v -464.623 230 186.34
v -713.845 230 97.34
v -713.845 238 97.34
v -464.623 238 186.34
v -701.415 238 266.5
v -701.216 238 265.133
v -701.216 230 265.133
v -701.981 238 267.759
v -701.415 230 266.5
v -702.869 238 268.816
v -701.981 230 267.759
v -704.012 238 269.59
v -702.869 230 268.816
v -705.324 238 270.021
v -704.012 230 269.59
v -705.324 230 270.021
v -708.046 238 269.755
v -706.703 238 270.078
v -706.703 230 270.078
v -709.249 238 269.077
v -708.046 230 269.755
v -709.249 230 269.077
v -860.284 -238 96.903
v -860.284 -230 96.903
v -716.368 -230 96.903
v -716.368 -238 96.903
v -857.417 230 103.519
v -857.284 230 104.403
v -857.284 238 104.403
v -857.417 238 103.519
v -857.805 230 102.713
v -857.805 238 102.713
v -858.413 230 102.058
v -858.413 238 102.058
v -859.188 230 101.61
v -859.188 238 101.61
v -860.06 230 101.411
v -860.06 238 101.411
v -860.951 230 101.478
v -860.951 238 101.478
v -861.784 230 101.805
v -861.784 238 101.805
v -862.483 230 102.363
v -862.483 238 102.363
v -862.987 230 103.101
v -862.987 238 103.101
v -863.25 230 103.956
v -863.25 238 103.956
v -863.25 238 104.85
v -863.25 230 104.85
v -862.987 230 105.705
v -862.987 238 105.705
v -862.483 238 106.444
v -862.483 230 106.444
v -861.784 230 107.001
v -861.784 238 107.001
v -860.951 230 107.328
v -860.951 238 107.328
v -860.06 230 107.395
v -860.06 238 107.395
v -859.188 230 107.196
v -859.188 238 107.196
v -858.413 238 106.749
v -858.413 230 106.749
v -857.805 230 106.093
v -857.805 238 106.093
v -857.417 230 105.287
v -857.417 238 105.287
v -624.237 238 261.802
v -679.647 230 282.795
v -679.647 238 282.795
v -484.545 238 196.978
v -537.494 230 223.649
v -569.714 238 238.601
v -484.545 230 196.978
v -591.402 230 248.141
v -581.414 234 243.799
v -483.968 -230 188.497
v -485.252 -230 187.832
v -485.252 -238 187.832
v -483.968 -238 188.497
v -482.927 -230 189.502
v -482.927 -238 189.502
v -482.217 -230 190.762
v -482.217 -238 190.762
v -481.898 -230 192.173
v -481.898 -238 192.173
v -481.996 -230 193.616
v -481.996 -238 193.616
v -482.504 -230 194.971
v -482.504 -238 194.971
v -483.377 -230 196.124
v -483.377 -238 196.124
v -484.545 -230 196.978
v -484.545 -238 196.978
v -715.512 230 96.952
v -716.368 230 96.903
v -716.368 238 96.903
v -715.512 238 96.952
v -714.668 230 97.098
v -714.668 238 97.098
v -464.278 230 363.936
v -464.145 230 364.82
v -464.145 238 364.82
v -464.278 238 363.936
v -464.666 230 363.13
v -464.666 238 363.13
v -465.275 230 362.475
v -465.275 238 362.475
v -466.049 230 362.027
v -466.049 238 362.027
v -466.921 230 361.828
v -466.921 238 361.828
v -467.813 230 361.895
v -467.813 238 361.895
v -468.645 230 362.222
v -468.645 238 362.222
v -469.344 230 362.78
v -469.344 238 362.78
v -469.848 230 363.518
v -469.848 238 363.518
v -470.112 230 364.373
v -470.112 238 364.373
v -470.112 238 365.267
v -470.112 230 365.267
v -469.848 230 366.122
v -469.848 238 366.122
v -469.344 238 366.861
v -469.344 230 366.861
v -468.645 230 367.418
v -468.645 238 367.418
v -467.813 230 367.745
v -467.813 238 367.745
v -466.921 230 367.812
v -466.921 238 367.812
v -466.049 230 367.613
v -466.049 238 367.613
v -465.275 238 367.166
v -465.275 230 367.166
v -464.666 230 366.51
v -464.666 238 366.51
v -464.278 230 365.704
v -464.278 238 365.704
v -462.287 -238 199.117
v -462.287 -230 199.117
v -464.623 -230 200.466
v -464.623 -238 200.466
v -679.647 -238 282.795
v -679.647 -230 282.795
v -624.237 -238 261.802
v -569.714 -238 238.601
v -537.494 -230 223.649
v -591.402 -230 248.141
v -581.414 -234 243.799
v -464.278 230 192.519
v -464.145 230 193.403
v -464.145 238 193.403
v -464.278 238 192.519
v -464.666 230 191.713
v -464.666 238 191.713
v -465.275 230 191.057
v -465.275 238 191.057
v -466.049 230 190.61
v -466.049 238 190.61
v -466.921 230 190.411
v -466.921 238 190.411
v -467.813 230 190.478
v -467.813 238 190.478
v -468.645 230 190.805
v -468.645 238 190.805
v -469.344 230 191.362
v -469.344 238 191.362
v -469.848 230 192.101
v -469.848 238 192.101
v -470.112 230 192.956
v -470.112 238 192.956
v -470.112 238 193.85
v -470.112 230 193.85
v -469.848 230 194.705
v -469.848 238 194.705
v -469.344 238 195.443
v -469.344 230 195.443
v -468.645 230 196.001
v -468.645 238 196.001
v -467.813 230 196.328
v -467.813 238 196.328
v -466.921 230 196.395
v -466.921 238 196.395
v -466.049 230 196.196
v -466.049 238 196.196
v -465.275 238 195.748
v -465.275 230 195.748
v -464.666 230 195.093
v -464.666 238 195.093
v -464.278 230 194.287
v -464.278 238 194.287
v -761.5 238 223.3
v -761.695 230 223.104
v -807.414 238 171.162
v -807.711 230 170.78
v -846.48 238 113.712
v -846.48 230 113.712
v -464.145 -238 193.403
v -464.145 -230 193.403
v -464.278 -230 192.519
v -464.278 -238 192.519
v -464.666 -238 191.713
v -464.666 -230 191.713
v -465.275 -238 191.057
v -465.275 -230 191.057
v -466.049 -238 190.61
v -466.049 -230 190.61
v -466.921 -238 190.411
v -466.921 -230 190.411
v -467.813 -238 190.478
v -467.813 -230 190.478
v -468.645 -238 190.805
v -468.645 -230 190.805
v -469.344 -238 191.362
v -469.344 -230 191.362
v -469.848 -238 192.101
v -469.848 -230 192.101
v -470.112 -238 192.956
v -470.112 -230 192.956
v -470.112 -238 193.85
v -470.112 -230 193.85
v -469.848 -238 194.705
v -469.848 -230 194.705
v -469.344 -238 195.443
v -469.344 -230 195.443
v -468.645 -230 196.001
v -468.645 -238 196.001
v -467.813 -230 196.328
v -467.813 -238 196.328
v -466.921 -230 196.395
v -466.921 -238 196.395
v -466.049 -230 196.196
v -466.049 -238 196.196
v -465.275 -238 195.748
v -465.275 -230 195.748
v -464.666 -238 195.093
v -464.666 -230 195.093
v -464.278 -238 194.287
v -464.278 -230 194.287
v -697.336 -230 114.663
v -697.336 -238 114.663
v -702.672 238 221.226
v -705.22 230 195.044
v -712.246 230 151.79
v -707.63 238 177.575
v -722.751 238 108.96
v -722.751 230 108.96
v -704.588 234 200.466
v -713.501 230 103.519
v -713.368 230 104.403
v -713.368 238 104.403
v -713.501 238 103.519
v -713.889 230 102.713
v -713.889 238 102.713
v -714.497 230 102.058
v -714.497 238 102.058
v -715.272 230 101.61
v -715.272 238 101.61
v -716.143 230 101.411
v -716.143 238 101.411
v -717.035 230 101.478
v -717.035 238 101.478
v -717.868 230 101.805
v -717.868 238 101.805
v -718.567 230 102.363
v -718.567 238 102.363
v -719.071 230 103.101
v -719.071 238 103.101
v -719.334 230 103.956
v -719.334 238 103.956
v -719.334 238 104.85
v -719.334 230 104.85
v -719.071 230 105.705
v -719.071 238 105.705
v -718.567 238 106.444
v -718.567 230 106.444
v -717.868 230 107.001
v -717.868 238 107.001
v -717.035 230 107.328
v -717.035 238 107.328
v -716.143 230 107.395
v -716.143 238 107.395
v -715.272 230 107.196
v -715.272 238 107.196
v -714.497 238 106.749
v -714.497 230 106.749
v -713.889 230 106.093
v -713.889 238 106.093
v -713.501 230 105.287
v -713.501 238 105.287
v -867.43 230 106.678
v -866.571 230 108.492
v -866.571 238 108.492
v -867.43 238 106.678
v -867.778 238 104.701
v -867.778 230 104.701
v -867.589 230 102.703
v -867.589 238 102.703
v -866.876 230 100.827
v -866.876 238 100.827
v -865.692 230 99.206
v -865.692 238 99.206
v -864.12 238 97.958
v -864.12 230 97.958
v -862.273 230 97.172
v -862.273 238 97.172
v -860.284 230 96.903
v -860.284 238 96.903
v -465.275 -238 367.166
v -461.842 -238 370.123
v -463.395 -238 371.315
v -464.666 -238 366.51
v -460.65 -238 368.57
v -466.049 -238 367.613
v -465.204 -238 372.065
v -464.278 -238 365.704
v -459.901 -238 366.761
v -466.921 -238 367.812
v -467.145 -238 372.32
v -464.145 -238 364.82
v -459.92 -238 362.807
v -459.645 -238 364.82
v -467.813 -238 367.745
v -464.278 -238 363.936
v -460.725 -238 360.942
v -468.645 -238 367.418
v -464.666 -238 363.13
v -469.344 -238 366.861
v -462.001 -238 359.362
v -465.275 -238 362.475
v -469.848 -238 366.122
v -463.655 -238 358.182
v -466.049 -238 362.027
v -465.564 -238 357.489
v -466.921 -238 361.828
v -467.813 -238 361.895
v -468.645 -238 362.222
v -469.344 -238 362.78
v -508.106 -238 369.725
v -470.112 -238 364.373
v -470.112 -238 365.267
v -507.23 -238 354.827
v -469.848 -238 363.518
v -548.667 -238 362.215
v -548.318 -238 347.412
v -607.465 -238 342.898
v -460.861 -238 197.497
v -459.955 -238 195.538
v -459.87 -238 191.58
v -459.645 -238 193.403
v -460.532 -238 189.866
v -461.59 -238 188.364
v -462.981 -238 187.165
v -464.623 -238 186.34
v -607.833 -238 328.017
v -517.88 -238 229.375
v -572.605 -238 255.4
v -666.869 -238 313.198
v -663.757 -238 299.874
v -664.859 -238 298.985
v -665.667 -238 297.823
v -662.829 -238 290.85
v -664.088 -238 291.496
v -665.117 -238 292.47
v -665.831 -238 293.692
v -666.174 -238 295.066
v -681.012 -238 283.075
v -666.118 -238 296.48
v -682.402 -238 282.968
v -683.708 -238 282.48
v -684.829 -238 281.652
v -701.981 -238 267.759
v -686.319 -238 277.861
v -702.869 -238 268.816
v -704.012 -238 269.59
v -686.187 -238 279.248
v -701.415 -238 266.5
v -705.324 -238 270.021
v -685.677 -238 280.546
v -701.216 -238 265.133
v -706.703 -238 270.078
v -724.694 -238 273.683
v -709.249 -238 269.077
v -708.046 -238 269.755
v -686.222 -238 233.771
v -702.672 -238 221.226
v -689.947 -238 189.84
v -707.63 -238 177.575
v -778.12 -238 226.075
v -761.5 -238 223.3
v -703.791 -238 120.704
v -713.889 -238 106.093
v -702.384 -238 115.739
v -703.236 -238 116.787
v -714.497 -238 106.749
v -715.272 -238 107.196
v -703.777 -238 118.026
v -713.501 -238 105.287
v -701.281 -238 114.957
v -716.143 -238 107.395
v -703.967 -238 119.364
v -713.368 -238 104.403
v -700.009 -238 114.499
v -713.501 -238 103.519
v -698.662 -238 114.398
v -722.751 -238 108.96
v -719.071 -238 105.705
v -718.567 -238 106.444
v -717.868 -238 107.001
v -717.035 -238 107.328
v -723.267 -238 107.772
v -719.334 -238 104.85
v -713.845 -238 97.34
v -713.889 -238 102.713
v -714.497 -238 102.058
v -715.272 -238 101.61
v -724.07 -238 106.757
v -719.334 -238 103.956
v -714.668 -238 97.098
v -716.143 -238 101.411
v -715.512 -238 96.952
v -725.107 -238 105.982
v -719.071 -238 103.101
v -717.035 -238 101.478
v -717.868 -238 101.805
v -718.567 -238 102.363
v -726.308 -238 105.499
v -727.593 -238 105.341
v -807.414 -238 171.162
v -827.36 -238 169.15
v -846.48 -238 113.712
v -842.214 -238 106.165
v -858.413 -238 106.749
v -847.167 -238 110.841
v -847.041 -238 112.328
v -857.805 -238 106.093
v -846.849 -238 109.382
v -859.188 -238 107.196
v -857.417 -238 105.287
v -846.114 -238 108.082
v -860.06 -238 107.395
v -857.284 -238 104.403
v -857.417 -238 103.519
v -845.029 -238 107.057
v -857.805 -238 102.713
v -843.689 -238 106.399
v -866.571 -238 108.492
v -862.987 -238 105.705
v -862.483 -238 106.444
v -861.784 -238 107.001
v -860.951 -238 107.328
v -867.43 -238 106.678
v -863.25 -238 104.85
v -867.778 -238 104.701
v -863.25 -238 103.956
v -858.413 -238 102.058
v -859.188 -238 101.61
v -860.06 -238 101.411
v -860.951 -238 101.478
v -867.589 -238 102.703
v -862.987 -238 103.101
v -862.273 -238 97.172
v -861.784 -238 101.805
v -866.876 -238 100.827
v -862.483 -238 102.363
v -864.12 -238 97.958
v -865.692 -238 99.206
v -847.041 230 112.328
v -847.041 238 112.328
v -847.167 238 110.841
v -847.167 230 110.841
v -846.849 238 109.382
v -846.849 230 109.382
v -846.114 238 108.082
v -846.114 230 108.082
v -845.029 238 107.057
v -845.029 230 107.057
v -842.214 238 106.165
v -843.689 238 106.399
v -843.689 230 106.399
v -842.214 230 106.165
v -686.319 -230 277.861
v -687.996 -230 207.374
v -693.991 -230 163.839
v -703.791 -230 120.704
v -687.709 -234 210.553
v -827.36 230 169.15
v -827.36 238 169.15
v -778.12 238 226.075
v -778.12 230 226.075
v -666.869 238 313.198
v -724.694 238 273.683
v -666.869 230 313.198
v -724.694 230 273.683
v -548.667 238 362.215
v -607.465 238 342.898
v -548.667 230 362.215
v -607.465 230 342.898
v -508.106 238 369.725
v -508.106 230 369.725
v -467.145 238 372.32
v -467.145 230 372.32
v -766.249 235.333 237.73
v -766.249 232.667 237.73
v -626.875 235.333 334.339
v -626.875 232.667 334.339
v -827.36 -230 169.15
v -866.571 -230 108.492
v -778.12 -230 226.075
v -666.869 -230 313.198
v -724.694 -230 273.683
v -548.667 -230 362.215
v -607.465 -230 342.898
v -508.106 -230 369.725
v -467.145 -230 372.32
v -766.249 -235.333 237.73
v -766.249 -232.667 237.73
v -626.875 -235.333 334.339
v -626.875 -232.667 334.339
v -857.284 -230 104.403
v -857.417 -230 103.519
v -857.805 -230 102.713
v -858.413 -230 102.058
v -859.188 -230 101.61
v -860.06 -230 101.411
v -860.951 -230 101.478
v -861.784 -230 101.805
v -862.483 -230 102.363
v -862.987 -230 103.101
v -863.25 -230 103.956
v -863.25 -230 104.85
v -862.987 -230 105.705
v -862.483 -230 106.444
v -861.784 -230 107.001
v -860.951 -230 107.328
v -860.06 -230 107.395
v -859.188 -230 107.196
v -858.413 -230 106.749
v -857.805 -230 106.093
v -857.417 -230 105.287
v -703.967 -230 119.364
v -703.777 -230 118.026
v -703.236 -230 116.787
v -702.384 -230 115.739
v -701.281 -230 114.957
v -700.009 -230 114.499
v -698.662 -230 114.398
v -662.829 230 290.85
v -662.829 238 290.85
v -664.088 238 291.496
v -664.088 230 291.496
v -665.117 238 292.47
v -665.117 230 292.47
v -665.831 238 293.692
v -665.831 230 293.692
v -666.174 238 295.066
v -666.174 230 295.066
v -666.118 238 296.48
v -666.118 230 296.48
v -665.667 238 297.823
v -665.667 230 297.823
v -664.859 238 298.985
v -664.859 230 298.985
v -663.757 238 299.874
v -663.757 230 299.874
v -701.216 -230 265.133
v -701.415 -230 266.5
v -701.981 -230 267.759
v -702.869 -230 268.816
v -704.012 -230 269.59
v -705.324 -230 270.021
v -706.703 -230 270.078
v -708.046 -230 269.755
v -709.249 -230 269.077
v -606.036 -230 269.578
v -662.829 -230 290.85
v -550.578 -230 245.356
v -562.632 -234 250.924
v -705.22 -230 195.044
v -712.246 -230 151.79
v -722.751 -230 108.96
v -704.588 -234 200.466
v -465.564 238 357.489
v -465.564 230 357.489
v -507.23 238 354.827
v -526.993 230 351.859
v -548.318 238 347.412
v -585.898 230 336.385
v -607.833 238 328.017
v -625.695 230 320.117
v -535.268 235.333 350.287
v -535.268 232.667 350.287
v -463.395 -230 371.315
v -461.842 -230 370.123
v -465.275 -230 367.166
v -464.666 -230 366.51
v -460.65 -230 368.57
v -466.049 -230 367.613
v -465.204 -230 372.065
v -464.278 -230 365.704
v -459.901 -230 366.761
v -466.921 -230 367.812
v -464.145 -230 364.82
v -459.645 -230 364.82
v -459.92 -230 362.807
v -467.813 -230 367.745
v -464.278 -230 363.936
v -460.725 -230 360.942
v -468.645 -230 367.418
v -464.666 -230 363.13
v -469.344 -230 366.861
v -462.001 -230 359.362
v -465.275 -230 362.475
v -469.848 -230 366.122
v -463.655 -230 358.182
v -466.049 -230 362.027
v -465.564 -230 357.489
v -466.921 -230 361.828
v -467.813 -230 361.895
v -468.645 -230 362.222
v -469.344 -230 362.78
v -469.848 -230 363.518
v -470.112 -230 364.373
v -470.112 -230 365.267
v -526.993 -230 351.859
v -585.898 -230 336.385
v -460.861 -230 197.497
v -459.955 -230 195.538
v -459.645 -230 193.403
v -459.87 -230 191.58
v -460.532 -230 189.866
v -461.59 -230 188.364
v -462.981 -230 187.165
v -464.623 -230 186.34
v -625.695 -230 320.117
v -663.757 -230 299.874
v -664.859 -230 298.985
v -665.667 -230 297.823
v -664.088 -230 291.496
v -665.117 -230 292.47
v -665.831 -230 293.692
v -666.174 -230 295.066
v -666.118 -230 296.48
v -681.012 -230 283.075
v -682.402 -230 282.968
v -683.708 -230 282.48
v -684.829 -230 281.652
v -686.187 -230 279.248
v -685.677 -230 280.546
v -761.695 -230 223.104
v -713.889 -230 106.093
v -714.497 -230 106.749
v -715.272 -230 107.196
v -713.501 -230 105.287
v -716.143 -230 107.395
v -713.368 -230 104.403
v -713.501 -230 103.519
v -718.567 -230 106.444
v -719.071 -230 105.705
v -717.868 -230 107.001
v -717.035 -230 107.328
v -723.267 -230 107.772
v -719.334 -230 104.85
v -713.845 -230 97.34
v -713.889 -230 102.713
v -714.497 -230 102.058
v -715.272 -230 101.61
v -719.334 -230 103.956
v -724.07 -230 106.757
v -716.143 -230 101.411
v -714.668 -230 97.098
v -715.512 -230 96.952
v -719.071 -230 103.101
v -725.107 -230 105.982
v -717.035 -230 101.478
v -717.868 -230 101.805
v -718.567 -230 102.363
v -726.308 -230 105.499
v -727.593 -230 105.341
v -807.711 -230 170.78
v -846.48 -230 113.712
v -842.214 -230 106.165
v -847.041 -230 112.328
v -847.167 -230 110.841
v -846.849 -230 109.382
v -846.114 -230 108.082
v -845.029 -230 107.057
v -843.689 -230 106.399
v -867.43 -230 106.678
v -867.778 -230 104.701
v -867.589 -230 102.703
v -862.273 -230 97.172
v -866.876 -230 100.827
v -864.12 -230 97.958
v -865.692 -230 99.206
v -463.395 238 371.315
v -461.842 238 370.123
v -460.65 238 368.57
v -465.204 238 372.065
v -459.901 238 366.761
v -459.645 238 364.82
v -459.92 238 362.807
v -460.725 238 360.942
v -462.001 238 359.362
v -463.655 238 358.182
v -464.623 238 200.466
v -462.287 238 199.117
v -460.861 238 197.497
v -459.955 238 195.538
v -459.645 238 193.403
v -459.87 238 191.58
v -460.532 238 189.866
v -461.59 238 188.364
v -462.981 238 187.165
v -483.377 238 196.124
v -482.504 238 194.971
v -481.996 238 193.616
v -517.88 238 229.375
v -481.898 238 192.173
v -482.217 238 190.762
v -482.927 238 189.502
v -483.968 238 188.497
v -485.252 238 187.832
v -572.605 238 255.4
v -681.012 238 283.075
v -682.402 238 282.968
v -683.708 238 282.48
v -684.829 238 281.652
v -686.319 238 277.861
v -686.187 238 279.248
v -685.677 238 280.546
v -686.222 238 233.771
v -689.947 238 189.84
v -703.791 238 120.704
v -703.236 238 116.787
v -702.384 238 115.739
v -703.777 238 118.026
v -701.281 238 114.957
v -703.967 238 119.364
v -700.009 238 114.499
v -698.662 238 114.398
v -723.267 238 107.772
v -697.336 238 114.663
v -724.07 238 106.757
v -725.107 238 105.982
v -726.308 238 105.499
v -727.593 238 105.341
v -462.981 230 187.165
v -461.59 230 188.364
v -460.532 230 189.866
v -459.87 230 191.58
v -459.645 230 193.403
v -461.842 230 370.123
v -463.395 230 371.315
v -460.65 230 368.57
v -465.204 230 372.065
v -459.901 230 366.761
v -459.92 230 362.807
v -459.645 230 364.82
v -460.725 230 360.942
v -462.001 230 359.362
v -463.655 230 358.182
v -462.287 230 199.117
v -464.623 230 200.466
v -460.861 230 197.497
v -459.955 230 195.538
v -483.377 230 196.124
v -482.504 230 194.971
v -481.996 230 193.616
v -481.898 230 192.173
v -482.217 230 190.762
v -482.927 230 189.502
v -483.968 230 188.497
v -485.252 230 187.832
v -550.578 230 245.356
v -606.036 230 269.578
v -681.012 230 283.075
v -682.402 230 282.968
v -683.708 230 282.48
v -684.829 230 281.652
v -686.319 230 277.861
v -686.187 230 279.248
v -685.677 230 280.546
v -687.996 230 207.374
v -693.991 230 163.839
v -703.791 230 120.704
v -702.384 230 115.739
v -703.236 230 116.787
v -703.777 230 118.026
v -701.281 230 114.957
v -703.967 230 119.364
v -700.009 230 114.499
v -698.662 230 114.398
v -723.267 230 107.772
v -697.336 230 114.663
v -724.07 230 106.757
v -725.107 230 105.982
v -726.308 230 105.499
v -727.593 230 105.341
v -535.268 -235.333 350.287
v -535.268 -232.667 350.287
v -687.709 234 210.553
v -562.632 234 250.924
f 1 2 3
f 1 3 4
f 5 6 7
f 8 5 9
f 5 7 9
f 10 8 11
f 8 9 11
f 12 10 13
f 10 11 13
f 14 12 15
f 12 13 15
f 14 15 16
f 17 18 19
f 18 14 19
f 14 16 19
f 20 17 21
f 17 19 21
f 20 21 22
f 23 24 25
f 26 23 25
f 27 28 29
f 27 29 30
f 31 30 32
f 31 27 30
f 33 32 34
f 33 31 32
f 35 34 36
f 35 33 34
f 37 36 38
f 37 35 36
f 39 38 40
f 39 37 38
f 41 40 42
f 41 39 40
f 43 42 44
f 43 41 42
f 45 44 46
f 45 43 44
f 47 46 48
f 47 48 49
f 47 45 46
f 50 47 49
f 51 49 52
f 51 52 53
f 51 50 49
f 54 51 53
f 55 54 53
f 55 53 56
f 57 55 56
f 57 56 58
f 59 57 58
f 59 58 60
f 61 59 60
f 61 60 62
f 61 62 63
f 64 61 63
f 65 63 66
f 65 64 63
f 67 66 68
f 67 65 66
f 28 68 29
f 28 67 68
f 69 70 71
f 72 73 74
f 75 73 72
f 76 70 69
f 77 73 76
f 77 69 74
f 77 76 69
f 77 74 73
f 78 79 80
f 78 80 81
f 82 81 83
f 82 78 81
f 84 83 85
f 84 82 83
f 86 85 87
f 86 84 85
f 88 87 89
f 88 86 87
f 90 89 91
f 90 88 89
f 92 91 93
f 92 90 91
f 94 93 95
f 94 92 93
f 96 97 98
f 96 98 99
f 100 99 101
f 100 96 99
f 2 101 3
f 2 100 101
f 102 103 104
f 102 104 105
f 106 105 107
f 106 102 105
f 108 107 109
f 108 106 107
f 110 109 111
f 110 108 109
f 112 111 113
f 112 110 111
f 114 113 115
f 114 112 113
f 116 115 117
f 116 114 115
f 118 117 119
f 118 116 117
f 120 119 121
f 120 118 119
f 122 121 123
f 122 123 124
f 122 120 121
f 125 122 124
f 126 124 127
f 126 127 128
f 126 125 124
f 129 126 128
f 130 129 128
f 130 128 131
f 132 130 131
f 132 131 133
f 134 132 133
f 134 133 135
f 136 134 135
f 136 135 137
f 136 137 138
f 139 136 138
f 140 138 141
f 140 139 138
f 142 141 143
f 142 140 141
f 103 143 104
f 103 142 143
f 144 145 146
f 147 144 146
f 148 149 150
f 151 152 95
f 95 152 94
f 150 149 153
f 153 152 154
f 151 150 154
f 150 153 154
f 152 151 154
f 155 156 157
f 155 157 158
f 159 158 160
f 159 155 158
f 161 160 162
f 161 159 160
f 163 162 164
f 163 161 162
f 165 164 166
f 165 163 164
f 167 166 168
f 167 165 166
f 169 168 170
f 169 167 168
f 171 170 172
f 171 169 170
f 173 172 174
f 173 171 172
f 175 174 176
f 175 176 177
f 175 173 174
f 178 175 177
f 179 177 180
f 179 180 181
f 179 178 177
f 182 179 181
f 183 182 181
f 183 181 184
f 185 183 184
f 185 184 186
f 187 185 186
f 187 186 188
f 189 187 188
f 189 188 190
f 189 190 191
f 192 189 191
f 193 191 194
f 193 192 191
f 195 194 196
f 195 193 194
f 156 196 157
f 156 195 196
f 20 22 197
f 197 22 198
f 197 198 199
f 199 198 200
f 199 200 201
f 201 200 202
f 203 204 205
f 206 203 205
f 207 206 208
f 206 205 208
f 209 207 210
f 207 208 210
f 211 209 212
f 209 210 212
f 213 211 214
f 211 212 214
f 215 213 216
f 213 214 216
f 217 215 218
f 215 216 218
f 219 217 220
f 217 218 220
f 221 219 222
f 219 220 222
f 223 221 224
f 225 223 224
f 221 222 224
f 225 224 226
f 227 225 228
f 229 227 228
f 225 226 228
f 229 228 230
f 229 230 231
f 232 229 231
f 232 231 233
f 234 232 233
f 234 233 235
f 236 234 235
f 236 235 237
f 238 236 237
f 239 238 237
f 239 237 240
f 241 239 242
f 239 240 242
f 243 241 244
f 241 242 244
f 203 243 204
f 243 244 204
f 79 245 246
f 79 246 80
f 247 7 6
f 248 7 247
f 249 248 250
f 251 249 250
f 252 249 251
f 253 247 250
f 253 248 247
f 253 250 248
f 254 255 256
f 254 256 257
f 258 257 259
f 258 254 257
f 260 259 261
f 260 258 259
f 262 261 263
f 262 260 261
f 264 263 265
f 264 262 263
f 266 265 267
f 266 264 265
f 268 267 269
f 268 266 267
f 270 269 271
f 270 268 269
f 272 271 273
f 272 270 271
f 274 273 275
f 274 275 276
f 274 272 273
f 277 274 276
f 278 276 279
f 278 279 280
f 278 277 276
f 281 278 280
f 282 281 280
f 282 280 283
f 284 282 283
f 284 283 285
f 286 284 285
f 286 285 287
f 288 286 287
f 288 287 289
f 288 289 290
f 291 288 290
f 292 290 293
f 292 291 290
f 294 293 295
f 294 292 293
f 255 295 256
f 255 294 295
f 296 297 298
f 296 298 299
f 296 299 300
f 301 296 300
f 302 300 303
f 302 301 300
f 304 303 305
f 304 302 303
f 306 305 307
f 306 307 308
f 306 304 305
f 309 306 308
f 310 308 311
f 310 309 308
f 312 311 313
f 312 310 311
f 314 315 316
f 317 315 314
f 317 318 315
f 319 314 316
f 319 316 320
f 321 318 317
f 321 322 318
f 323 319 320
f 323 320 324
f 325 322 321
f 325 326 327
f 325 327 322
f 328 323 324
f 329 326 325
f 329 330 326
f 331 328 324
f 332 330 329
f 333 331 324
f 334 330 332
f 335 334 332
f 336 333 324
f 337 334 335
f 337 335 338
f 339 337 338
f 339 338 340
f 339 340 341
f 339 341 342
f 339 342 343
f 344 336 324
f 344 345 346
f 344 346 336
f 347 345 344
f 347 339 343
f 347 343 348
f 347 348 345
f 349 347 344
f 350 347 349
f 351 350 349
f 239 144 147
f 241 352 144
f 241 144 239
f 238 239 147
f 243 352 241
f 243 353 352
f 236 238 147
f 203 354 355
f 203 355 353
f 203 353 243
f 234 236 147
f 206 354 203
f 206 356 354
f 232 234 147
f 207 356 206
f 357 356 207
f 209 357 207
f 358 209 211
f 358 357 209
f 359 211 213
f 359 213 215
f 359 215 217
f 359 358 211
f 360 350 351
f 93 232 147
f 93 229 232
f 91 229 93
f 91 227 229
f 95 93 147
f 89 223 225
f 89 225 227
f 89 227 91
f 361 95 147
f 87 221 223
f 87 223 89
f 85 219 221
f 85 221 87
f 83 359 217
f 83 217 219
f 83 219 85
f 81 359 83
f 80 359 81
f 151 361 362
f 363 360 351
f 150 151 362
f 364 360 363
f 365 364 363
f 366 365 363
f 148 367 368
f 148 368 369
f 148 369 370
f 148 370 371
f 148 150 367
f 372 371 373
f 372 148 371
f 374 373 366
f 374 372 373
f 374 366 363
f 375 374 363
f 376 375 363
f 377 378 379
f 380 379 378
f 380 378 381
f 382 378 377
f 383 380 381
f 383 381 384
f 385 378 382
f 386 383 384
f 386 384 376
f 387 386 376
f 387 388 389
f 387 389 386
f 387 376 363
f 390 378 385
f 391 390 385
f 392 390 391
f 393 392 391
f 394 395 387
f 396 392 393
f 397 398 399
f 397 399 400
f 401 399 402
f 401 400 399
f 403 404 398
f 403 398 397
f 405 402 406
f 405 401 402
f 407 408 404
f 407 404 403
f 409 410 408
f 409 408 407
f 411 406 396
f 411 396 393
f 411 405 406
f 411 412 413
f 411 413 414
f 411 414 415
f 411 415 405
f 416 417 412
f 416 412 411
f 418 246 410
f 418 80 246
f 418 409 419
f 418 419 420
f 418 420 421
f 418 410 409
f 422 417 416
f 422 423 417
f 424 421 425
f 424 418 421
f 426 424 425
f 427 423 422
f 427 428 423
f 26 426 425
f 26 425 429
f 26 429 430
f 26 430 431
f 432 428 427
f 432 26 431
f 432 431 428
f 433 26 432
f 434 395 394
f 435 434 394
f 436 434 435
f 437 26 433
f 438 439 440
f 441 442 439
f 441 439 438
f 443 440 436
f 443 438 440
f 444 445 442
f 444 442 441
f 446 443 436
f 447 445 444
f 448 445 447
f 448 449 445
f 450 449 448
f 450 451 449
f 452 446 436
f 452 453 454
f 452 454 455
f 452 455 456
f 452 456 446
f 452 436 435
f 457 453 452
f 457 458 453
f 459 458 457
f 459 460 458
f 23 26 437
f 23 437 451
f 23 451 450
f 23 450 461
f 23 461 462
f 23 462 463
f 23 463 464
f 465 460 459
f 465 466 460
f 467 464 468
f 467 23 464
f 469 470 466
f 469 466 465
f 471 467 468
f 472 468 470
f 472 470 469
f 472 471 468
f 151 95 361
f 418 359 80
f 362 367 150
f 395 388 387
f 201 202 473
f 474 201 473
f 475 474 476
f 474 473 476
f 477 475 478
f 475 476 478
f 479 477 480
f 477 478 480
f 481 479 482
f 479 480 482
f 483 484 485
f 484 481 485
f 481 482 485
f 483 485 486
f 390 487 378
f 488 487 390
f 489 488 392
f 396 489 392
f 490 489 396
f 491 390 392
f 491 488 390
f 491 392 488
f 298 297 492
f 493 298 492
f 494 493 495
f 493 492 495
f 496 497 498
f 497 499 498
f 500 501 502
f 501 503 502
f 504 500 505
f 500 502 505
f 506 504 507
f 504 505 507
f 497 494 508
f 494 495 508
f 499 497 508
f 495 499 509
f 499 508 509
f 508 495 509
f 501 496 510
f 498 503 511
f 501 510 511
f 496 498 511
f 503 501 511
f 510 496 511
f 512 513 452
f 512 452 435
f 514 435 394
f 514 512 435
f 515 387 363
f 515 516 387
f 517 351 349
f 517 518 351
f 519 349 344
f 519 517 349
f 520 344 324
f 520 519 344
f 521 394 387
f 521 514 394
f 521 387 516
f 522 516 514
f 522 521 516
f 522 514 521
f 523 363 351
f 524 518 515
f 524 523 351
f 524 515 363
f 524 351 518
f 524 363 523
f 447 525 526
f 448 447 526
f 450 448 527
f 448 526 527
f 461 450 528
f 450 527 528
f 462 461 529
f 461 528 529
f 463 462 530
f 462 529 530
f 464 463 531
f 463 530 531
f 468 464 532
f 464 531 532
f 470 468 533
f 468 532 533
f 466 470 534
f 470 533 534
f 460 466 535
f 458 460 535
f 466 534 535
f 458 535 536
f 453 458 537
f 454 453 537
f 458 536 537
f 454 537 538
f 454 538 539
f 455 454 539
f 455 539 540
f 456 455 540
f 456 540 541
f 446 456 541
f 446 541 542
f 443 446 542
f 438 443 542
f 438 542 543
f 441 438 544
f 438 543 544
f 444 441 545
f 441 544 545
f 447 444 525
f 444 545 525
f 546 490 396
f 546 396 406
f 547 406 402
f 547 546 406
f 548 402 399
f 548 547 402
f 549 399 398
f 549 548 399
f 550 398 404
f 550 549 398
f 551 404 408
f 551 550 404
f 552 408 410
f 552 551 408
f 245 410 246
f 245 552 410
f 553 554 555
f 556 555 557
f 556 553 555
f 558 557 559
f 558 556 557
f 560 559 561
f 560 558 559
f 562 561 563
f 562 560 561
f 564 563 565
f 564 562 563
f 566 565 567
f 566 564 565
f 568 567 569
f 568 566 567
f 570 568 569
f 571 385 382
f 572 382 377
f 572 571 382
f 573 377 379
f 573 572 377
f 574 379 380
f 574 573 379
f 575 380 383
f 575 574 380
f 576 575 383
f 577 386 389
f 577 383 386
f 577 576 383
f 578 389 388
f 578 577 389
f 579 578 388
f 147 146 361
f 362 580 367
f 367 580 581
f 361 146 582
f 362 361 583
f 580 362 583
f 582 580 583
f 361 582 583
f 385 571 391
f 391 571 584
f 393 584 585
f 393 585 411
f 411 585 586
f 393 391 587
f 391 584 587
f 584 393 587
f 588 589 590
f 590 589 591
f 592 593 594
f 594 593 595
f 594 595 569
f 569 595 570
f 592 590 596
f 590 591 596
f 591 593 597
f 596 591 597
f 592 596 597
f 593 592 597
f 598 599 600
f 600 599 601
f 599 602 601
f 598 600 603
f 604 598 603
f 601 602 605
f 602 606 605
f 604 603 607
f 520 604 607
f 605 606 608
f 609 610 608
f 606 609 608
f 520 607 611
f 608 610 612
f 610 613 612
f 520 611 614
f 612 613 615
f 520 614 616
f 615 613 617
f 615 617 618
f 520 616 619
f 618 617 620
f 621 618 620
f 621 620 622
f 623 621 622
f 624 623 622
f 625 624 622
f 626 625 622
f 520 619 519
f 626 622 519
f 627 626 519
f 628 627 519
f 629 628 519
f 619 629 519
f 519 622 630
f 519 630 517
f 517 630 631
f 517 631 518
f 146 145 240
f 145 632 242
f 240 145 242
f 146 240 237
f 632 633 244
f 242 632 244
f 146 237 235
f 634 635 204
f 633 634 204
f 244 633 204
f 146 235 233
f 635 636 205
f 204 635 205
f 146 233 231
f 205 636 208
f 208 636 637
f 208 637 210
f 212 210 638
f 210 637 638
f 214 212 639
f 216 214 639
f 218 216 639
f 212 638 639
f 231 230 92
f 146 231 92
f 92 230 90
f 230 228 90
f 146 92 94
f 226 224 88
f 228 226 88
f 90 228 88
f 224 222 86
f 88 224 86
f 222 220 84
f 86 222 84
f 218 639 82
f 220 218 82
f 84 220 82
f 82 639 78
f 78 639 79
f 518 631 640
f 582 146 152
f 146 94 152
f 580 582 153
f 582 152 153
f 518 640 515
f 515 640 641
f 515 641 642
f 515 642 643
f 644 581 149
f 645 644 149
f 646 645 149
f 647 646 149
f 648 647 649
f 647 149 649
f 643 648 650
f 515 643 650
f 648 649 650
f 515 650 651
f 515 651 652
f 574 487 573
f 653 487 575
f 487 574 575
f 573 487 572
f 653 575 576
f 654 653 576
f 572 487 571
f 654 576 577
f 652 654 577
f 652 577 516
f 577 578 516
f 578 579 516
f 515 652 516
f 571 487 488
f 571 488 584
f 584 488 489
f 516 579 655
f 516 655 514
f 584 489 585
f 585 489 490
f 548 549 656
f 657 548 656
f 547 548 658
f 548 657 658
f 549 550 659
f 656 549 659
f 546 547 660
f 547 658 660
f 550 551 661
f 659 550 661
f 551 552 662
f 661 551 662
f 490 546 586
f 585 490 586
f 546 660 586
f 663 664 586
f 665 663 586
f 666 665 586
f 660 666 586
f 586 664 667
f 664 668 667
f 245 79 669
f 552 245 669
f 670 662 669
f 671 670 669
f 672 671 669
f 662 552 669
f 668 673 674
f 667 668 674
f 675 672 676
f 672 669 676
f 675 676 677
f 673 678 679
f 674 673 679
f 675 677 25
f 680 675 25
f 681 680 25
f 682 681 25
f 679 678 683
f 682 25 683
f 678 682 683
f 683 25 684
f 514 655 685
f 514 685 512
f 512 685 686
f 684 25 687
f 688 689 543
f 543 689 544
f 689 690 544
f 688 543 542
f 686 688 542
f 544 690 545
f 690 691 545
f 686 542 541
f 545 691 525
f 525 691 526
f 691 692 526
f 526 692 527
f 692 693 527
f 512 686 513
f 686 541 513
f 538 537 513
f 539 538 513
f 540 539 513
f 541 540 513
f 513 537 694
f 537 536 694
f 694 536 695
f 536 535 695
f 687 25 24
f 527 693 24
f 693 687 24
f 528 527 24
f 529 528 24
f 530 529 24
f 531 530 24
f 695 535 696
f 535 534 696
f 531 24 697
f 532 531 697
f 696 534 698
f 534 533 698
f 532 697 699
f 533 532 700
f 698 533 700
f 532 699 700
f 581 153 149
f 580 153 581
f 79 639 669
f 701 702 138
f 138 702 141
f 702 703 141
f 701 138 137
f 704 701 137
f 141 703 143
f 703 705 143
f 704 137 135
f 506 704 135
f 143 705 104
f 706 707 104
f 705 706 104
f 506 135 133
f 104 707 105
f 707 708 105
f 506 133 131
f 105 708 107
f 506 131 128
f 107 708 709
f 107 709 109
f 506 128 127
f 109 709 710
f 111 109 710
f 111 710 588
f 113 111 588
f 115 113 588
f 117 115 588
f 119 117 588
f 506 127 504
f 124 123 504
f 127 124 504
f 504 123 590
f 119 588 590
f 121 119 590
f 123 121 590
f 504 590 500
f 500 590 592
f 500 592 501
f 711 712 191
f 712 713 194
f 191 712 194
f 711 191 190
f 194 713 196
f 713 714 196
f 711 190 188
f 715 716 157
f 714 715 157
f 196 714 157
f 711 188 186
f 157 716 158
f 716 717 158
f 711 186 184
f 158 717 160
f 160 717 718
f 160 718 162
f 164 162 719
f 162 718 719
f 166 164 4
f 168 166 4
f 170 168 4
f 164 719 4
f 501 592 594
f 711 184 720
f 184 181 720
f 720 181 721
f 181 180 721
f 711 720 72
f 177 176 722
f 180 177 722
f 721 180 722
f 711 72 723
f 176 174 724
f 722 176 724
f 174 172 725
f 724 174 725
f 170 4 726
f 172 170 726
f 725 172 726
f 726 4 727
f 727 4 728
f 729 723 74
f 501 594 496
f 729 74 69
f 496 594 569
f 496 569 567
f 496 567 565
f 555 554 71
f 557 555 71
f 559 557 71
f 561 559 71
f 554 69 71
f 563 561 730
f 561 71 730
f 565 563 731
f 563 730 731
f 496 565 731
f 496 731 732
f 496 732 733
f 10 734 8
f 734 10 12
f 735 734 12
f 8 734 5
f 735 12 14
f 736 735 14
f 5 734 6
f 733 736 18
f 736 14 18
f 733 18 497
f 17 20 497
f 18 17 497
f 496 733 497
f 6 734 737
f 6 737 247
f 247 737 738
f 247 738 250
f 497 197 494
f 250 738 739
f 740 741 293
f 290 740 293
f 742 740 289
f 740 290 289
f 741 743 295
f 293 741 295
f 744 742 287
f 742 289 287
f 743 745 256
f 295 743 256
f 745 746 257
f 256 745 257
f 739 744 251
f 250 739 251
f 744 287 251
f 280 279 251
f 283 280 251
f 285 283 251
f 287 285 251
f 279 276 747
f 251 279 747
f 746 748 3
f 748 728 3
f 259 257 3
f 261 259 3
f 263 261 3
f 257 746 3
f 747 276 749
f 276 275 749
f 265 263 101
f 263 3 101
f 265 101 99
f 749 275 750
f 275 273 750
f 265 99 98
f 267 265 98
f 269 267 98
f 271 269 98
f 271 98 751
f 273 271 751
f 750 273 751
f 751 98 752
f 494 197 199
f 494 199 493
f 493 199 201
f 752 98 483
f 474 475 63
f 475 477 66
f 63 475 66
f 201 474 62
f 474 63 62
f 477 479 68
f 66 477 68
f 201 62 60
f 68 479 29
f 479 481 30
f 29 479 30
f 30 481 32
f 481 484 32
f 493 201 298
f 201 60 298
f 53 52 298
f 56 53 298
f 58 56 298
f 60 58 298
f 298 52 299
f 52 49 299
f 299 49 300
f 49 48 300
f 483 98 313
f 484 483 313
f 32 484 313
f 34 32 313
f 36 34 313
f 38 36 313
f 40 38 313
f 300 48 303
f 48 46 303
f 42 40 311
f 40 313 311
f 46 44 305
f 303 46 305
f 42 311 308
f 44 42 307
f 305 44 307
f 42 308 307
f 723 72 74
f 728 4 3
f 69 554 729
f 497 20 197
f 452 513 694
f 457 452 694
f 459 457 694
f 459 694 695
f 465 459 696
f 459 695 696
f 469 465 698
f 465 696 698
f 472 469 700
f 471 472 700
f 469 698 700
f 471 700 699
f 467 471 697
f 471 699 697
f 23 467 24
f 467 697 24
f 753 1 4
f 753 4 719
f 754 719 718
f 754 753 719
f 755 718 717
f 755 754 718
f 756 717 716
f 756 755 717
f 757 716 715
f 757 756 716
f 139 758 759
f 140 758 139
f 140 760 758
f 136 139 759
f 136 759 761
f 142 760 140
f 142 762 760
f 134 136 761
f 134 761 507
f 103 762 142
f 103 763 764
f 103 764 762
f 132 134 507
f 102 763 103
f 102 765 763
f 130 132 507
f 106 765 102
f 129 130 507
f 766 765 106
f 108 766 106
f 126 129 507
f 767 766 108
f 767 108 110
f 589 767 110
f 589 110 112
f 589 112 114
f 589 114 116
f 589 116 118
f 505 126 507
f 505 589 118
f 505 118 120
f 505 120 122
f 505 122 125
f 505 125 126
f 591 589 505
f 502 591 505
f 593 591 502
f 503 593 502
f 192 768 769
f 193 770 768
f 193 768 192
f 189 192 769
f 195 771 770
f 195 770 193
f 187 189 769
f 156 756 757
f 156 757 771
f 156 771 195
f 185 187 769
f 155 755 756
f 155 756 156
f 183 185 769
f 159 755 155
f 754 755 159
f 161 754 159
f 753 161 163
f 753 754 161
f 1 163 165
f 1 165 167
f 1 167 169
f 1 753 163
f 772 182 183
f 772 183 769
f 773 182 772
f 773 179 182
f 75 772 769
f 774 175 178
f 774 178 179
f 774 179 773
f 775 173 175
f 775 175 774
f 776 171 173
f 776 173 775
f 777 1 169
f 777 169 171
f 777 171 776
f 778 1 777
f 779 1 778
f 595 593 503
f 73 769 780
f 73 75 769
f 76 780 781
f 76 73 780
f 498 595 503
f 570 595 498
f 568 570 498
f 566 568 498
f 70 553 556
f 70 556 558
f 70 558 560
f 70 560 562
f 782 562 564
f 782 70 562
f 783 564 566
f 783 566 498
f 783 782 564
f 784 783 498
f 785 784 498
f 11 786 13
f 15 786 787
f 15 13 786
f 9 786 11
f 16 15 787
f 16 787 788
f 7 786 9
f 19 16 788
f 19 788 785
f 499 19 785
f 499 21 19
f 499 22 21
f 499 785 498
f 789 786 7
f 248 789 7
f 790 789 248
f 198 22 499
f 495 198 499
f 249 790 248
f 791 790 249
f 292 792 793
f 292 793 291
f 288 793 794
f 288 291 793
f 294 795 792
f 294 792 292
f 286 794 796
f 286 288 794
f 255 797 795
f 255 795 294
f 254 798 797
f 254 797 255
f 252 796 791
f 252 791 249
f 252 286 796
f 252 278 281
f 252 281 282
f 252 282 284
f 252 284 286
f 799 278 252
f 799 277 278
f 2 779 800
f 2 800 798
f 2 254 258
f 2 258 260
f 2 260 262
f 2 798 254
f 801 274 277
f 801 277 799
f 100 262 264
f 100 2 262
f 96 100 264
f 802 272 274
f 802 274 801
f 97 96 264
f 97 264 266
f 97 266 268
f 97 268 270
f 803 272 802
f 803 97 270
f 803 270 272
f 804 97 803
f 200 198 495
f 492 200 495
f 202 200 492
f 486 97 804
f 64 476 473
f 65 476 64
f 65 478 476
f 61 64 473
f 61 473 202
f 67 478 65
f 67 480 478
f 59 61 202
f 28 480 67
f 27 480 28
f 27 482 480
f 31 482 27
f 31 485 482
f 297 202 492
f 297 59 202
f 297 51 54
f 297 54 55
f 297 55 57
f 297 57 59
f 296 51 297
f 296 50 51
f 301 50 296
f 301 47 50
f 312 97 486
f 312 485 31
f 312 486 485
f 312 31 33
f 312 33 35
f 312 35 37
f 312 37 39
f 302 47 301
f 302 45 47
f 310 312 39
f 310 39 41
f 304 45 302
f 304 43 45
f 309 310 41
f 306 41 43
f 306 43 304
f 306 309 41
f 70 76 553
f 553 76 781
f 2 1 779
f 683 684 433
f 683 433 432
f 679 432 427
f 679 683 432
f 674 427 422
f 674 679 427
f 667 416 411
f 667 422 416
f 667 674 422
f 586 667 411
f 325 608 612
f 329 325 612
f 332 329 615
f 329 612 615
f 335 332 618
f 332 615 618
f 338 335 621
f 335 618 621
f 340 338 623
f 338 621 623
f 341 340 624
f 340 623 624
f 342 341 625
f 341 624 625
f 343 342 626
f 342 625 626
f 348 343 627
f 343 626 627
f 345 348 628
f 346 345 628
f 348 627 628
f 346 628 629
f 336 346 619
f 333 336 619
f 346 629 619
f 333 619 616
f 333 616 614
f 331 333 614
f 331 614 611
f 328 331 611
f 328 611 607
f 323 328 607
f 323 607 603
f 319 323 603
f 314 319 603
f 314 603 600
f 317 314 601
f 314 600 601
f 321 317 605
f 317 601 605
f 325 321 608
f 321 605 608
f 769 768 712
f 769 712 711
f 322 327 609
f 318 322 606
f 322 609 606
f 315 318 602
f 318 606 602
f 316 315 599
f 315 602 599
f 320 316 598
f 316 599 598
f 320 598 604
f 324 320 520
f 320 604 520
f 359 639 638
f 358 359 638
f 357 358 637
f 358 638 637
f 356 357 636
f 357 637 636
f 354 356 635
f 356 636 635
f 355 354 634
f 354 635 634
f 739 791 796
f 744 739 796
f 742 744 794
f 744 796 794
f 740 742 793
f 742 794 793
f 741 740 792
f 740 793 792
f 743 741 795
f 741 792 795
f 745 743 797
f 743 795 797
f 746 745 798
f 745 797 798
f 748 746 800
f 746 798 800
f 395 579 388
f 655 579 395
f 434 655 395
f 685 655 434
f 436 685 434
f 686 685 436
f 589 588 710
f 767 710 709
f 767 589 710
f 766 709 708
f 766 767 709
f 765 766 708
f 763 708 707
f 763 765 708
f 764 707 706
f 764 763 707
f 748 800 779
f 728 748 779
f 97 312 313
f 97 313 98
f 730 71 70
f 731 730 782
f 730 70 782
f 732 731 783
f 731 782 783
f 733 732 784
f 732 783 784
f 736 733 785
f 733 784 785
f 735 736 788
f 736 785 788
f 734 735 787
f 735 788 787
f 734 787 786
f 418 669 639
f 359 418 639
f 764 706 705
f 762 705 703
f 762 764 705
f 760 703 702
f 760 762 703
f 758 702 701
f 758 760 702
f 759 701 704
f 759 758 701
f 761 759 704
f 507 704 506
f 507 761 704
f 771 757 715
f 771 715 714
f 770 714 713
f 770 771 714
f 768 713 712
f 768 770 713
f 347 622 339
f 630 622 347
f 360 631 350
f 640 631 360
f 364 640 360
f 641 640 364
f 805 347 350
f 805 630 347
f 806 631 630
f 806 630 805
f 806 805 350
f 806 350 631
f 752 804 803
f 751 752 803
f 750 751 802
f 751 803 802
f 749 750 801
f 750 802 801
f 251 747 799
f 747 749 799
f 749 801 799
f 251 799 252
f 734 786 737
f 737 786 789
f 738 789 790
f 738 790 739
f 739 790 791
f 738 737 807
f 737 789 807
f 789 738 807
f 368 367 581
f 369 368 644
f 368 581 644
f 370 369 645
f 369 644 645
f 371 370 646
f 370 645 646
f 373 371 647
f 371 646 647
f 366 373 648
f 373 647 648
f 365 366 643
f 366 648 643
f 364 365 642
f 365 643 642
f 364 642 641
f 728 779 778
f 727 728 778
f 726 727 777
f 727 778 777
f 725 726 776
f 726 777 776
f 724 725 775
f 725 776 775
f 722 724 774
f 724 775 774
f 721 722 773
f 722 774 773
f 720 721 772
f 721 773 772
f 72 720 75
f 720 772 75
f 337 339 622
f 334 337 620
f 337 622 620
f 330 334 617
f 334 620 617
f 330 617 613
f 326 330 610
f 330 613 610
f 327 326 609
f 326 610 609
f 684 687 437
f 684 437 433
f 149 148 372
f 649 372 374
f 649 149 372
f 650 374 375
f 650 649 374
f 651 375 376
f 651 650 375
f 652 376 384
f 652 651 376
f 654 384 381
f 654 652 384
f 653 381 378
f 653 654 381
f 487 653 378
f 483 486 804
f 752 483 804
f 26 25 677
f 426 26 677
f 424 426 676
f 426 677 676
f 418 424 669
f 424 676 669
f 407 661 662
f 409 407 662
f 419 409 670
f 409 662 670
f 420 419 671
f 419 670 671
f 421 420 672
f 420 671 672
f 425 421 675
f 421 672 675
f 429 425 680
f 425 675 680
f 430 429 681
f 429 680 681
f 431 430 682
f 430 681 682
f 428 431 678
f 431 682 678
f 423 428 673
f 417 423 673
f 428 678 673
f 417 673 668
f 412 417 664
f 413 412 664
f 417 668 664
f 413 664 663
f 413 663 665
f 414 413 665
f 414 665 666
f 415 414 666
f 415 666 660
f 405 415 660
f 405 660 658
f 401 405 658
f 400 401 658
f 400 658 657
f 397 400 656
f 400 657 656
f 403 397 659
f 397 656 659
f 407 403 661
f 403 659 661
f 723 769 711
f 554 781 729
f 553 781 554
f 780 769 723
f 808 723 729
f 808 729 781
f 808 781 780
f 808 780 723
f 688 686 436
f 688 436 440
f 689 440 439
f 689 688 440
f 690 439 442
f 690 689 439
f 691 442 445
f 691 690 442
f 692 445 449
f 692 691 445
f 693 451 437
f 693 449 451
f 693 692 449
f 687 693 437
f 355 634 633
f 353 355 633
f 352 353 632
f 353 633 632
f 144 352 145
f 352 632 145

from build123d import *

# Parameters (mm, degrees)
SZKIC1_R                    = 3
DODANIE_WYCI_GNI_CIE1_DEPTH = 8
WYTNIJ_WYCI_GNI_CIE1_DEPTH  = 10


with BuildPart() as part:
    # Szkic1 → Dodanie-wyciągnięcie1 (new body)
    with BuildSketch(Plane(origin=(0, -230, 0), x_dir=(1, 0, 0), z_dir=(0, 1, 0))):
        with BuildLine():
            Line((-860.283761323, -96.903028566), (-716.367623737, -96.903028566))
            ThreePointArc((-716.367623737, -96.903028566), (-715.087689008, -97.01305109), (-713.845306719, -97.339890675))
            Line((-713.845306719, -97.339890675), (-464.622728154, -186.339760243))
            ThreePointArc((-464.622728154, -186.339760243), (-461.014491459, -189.082445474), (-459.645045171, -193.402898133))
            Line((-459.645045171, -193.402898133), (-459.645045171, -364.820100819))
            ThreePointArc((-459.645045171, -364.820100819), (-461.841744312, -370.123401678), (-467.145045171, -372.320100819))
            add(Edge.make_bspline(
                [(-866.570954117, -108.492185785), (-792.00641608, -245.378469281), (-630.821489356, -372.320100819), (-467.145045171, -372.320100819)],
                knots=[0, 0, 0, 0, 1, 1, 1, 1], degree=3))
            ThreePointArc((-866.570954117, -108.492185785), (-866.876131122, -100.826625285), (-860.283761323, -96.903028566))
        make_face()
        with Locations((-860.283761323, -104.403028566)):
            Circle(SZKIC1_R, mode=Mode.SUBTRACT)
        with Locations((-716.367623737, -104.403028566)):
            Circle(SZKIC1_R, mode=Mode.SUBTRACT)
        with Locations((-467.145045171, -364.820100819)):
            Circle(SZKIC1_R, mode=Mode.SUBTRACT)
        with Locations((-467.145045171, -193.402898133)):
            Circle(SZKIC1_R, mode=Mode.SUBTRACT)
    extrude(amount=-DODANIE_WYCI_GNI_CIE1_DEPTH)

    # Szkic3 → Wytnij-wyciągnięcie1 (cut)
    with BuildSketch(Plane(origin=(0, -230, 0), x_dir=(1, 0, 0), z_dir=(0, 1, 0))):
        with BuildLine():
            add(Edge.make_bspline(
                [(-709.248534219, -269.07668038), (-722.179737317, -259.210827847), (-775.604005814, -214.162441173), (-819.746188645, -158.864006657), (-846.480343559, -113.712350137)],
                knots=[0.543324795, 0.543324795, 0.543324795, 0.543324795, 0.643434608, 0.972151832, 0.972151832, 0.972151832, 0.972151832], degree=3))
            ThreePointArc((-846.480343559, -113.712350137), (-846.530624115, -108.704381299), (-842.213905835, -106.16504609))
            Line((-842.213905835, -106.16504609), (-727.592781287, -105.340783466))
            ThreePointArc((-727.592781287, -105.340783466), (-724.563211054, -106.335873539), (-722.751263872, -108.959868102))
            add(Edge.make_bspline(
                [(-701.215793155, -265.133388319), (-701.077439027, -243.423735214), (-703.820061872, -190.825193742), (-714.078774615, -139.14281138), (-722.751263872, -108.959868102)],
                knots=[0.056948511, 0.056948511, 0.056948511, 0.056948511, 0.434451685, 0.97809878, 0.97809878, 0.97809878, 0.97809878], degree=3))
            ThreePointArc((-701.215793155, -265.133388319), (-704.012349781, -269.589874199), (-709.248534219, -269.07668038))
        make_face()
        with BuildLine():
            add(Edge.make_bspline(
                [(-686.319170472, -277.860544771), (-685.302920026, -255.26935331), (-686.39468841, -202.387194664), (-695.705663637, -150.367651954), (-703.790790165, -120.703989623)],
                knots=[0.039856792, 0.039856792, 0.039856792, 0.039856792, 0.403728138, 0.897512765, 0.897512765, 0.897512765, 0.897512765], degree=3))
            ThreePointArc((-703.790790165, -120.703989623), (-702.383503754, -115.738687501), (-697.33606889, -114.662545549))
            Line((-697.33606889, -114.662545549), (-485.252395428, -187.832196761))
            ThreePointArc((-485.252395428, -187.832196761), (-481.897987574, -192.173154702), (-484.544842355, -196.978373497))
            add(Edge.make_bspline(
                [(-679.646661827, -282.79541905), (-646.392972029, -270.951909358), (-580.318683117, -244.722081668), (-516.306620405, -213.782500871), (-484.544842355, -196.978373497)],
                knots=[0.03217455, 0.03217455, 0.03217455, 0.03217455, 0.487326478, 0.950667765, 0.950667765, 0.950667765, 0.950667765], degree=3))
            ThreePointArc((-679.646661827, -282.79541905), (-684.297353643, -282.105250194), (-686.319170472, -277.860544771))
        make_face()
        with BuildLine():
            Line((-459.645045171, -364.820100819), (-459.645045171, -193.402898133))
            ThreePointArc((-459.645045171, -193.402898133), (-460.337418676, -196.550313185), (-462.28670424, -199.116611759))
            Line((-462.28670424, -199.116611759), (-464.622728154, -200.466036024))
            add(Edge.make_bspline(
                [(-464.622728154, -200.466036024), (-496.556052513, -218.91259494), (-561.198503951, -252.191994525), (-628.724382783, -279.099976613), (-662.828576381, -290.850183316)],
                knots=[0, 0, 0, 0, 0.481929693, 0.953574963, 0.953574963, 0.953574963, 0.953574963], degree=3))
            ThreePointArc((-662.828576381, -290.850183316), (-666.173575672, -295.065611568), (-663.757232459, -299.873952351))
            add(Edge.make_bspline(
                [(-465.564272351, -357.488582744), (-536.676618046, -357.101187386), (-603.973726194, -335.458782), (-663.757232459, -299.873952351)],
                knots=[0, 0, 0, 0, 0.430291094, 0.430291094, 0.430291094, 0.430291094], degree=3))
            ThreePointArc((-465.564272351, -357.488582744), (-461.309559067, -360.108720775), (-459.645045171, -364.820100819))
        make_face()
    extrude(amount=-WYTNIJ_WYCI_GNI_CIE1_DEPTH, mode=Mode.SUBTRACT)


with BuildPart() as body_2:
    # Lustro1: mirrored copy
    add(part.part.mirror(Plane.ZX))


solid = Compound([part.part, body_2.part])
